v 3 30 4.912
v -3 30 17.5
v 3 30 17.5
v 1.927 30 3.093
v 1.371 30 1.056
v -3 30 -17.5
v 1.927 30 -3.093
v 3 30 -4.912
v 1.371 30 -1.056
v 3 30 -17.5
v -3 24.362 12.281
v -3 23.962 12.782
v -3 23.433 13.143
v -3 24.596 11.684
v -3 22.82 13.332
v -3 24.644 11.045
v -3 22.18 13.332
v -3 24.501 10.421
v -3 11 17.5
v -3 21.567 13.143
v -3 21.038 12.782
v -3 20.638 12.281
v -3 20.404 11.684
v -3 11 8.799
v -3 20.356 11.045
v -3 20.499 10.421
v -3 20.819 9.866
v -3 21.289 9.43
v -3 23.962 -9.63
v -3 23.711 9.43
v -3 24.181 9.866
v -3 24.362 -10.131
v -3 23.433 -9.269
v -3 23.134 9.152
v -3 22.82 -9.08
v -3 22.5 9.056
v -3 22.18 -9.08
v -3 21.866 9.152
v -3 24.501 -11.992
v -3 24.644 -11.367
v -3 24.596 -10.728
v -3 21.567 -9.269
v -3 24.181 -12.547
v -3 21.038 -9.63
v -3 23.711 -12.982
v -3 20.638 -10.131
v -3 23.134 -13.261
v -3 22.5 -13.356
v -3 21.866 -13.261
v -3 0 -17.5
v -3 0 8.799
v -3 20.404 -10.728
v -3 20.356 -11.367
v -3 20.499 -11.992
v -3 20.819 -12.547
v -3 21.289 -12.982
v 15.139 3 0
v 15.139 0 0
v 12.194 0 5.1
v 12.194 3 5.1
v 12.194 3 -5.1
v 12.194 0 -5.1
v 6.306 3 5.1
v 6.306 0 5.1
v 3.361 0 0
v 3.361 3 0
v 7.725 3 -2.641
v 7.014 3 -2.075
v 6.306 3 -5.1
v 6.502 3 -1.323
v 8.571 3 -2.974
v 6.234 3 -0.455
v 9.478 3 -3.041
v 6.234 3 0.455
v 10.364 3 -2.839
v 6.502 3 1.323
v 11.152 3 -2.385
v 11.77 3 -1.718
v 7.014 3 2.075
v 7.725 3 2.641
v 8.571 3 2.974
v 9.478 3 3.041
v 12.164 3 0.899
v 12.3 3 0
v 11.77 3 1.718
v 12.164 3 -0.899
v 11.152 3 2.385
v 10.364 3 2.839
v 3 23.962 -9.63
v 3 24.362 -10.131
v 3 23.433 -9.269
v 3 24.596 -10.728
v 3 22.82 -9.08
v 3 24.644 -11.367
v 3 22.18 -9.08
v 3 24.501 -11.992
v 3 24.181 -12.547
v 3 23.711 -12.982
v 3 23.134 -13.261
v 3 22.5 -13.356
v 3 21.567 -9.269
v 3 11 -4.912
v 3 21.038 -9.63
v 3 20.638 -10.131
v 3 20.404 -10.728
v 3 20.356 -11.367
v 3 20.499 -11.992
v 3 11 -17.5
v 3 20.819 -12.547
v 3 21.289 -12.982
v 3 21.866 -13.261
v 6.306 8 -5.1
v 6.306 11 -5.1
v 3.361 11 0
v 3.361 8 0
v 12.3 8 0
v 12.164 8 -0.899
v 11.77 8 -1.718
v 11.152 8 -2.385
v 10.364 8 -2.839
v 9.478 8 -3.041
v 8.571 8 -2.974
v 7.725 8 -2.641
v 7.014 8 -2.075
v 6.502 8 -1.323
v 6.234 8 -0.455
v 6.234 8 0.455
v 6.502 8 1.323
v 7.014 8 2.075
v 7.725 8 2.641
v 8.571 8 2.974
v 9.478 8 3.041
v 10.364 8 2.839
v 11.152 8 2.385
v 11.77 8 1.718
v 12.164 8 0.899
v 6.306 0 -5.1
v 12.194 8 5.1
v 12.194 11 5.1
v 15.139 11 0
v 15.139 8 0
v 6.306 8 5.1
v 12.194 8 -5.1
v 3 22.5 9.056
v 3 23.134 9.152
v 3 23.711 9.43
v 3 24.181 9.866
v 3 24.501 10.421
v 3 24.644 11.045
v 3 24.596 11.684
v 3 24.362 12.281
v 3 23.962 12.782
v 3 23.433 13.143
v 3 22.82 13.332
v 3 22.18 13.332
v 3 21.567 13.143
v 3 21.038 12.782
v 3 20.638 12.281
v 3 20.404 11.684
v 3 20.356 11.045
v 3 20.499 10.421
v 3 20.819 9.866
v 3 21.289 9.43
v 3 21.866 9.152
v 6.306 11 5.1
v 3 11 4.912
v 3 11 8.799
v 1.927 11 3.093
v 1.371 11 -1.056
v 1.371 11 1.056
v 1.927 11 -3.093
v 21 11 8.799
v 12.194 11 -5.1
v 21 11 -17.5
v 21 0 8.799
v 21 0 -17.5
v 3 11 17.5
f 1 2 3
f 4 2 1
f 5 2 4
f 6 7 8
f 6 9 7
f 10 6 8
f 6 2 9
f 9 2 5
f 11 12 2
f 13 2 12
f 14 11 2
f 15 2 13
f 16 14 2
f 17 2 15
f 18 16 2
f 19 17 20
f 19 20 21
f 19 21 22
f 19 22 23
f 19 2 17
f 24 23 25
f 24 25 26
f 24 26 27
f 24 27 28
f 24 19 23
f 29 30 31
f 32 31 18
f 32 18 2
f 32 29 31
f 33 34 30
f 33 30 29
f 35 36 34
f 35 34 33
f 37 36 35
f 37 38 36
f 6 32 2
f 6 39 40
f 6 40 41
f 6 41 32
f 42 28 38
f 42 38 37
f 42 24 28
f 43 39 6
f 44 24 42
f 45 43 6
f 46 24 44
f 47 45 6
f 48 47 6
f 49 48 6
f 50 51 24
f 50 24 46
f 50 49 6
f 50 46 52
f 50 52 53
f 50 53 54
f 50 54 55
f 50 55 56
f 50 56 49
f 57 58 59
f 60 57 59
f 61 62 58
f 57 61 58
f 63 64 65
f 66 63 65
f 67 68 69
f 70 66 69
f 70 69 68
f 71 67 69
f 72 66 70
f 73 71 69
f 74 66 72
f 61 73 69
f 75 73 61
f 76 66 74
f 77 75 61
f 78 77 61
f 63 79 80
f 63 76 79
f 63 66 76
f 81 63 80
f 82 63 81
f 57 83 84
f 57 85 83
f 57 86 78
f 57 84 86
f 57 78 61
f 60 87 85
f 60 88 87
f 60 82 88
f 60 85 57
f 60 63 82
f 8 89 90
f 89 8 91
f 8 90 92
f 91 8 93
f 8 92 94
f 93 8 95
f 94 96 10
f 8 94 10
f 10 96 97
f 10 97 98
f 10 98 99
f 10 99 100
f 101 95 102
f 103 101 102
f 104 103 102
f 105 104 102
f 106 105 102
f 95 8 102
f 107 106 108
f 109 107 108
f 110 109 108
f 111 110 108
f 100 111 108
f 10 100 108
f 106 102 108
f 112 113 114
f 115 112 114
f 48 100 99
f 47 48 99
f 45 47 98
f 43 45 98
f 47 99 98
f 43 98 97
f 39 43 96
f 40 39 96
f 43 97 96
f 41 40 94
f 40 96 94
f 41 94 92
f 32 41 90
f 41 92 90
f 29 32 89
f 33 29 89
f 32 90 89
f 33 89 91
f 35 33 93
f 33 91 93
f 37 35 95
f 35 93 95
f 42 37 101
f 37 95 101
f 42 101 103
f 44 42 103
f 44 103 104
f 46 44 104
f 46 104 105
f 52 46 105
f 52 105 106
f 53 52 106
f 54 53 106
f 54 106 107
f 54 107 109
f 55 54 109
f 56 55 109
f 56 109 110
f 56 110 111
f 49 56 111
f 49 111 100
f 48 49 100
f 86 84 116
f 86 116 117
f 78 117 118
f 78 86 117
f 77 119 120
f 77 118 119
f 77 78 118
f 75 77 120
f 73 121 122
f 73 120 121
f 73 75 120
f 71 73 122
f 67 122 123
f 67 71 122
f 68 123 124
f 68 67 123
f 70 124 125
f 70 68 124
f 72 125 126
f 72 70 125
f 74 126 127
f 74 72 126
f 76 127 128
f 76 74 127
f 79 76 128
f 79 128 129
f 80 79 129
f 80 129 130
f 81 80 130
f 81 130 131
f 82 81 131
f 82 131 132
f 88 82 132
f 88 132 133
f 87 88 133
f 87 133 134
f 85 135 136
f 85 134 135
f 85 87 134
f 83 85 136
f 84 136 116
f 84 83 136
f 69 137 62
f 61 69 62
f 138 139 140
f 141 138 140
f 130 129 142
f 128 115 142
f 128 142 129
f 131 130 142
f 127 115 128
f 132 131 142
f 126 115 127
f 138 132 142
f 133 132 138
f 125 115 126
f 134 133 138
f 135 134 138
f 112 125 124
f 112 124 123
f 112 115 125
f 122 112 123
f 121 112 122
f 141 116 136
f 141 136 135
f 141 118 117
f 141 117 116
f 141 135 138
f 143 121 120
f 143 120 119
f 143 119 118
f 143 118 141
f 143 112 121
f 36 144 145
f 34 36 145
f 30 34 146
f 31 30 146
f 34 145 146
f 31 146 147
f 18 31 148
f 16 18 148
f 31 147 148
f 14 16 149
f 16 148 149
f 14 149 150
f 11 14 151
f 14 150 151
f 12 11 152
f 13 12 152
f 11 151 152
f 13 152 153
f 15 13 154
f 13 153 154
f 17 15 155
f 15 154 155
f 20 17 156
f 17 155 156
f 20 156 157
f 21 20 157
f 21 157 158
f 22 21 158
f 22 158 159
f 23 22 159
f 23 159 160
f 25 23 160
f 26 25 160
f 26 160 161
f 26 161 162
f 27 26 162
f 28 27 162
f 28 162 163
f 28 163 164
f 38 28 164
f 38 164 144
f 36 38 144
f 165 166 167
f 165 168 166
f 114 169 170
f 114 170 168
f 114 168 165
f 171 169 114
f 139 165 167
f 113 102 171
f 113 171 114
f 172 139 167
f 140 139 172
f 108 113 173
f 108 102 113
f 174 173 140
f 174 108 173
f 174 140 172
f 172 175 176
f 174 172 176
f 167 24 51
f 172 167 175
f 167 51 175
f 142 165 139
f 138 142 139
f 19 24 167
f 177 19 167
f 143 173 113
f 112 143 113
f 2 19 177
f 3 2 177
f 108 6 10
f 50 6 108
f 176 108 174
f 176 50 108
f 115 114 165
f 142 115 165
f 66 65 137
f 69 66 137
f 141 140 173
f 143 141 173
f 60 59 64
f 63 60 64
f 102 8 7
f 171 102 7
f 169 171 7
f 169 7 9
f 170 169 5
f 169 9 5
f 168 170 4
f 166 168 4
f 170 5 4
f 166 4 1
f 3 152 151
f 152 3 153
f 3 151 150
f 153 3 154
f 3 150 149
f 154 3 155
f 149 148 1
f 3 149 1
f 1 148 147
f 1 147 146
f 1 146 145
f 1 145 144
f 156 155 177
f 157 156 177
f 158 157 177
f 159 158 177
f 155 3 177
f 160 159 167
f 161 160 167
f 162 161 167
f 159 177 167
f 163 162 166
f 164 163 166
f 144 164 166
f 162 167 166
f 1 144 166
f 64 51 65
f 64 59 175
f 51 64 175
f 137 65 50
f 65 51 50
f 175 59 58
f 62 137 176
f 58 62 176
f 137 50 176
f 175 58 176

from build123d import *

# Parameters (mm, degrees)
SKETCH1_W           = 18
SKETCH1_H           = 35
SKETCH1_R           = 3.05
BOSS_EXTRUDE1_DEPTH = 11
SKETCH1_3_W         = 6
SKETCH1_3_H         = 35
BOSS_EXTRUDE2_DEPTH = 30
SKETCH2_R           = 7.949273458
CUT_EXTRUDE1_DEPTH  = 19
CUT_EXTRUDE3_DEPTH  = 3
CUT_EXTRUDE4_DEPTH  = 3
SKETCH7_R           = 2.15
CUT_EXTRUDE6_DEPTH  = 10
SKETCH8_W           = 24
SKETCH8_H           = 8.700587772
CUT_EXTRUDE7_DEPTH  = 11


with BuildPart() as part:
    # Sketch1 → Boss-Extrude1 (new body)
    with BuildSketch(Plane(origin=(0, 0, 0), x_dir=(1, 0, 0), z_dir=(0, 1, 0))):
        with Locations((12, 0)):
            Rectangle(SKETCH1_W, SKETCH1_H)
        with Locations((9.25, 0)):
            Circle(SKETCH1_R, mode=Mode.SUBTRACT)
    extrude(amount=BOSS_EXTRUDE1_DEPTH)

    # Sketch1<3> → Boss-Extrude2 (add)
    with BuildSketch(Plane(origin=(0, 0, 0), x_dir=(1, 0, 0), z_dir=(0, 1, 0))):
        Rectangle(SKETCH1_3_W, SKETCH1_3_H)
    extrude(amount=BOSS_EXTRUDE2_DEPTH)

    # Sketch2 → Cut-Extrude1 (cut)
    with BuildSketch(Plane(origin=(0, 30, 0), x_dir=(1, 0, 0), z_dir=(0, 1, 0))):
        with Locations((9.25, 0)):
            Circle(SKETCH2_R)
    extrude(amount=-CUT_EXTRUDE1_DEPTH, mode=Mode.SUBTRACT)

    # Sketch4 → Cut-Extrude3 (cut)
    with BuildSketch(Plane(origin=(0, 11, 0), x_dir=(1, 0, 0), z_dir=(0, 1, 0))):
        Polygon((15.138972746, 0), (12.194486373, 5.1), (6.305513627, 5.1), (3.361027254, 0), (6.305513627, -5.1), (12.194486373, -5.1), align=None)
    extrude(amount=-CUT_EXTRUDE3_DEPTH, mode=Mode.SUBTRACT)

    # Sketch5 → Cut-Extrude4 (cut)
    with BuildSketch(Plane.XZ):
        Polygon((3.361027254, 0), (6.305513627, -5.1), (12.194486373, -5.1), (15.138972746, 0), (12.194486373, 5.1), (6.305513627, 5.1), align=None)
    extrude(amount=-CUT_EXTRUDE4_DEPTH, mode=Mode.SUBTRACT)

    # Sketch7 → Cut-Extrude6 (cut)
    with BuildSketch(Plane(origin=(3, 0, 0), x_dir=(0, 0, -1), z_dir=(1, 0, 0))):
        with Locations((-11.206035856, 22.5)):
            Circle(SKETCH7_R)
        with Locations((11.206035856, 22.5)):
            Circle(SKETCH7_R)
    extrude(amount=-CUT_EXTRUDE6_DEPTH, mode=Mode.SUBTRACT)

    # Sketch8 → Cut-Extrude7 (cut)
    with BuildSketch(Plane.XZ):
        with Locations((9, 13.149706114)):
            Rectangle(SKETCH8_W, SKETCH8_H)
    extrude(amount=-CUT_EXTRUDE7_DEPTH, mode=Mode.SUBTRACT)


solid = part.part
